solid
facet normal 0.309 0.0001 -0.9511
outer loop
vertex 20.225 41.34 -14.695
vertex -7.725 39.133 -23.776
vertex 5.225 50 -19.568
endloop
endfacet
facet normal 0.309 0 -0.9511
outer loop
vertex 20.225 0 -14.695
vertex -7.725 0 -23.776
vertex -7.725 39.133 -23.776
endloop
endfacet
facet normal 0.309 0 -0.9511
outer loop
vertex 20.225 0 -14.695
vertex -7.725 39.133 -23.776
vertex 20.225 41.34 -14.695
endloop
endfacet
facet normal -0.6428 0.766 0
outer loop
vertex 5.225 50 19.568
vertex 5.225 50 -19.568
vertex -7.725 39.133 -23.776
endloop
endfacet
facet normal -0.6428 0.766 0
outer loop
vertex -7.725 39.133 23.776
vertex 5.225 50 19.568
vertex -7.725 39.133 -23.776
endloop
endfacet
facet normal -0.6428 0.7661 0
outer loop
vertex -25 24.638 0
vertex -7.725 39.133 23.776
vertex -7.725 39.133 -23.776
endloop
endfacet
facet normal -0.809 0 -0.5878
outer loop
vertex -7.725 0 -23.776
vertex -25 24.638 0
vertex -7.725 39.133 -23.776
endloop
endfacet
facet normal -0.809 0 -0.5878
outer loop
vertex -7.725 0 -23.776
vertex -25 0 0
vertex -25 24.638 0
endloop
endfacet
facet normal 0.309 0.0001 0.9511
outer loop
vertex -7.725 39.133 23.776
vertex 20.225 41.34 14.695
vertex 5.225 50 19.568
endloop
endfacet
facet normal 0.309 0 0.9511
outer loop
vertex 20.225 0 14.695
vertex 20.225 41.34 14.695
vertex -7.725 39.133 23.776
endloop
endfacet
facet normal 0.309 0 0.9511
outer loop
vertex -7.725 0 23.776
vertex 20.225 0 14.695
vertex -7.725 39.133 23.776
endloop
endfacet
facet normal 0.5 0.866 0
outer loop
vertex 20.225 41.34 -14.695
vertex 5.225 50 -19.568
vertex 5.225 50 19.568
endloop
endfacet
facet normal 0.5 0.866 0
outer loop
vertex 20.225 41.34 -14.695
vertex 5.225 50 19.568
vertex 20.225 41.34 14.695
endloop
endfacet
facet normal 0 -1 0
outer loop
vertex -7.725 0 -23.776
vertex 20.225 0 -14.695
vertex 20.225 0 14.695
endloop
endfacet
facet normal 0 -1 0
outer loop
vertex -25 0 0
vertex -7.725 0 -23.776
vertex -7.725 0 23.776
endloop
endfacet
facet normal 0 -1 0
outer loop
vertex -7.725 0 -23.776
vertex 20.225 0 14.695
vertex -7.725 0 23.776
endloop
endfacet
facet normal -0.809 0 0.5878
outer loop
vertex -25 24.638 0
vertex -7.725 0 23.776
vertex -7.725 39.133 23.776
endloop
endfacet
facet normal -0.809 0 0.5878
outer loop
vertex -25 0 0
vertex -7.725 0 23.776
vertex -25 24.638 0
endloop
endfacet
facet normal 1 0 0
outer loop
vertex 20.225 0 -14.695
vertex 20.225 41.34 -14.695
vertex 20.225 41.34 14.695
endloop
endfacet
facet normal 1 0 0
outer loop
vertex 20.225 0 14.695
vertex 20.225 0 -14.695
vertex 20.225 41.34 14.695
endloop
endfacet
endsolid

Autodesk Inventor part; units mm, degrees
ref_plane "YZ Plane" through (0, 0, 0) normal (1, 0, 0) x (0, 1, 0)
ref_plane "XZ Plane" through (0, 0, 0) normal (0, 1, 0) x (-1, 0, 0)
ref_plane "XY Plane" through (0, 0, 0) normal (0, 0, 1) x (1, 0, 0)
sketch "Эскиз3" plane through (0, 0, 0) normal (1, 0, 0) x (0, 1, 0)
  line L0 (50, 7.7254) -> (50, -20.2254) projected
  line L1 (50, -6.25) -> (41.9313, -20.2254)
  line L2 (50, -6.25) -> (23.7781, 25)
  line L3 (50, 25) -> (50, 7.7254) projected
  line L4 (0, -20.2254) -> (50, -20.2254) projected
  line L5 (0, 25) -> (50, 25) projected
  line L6 (23.7781, 25) -> (25, -20.2254)
  point P0 (0, 0)
  dimension "d4" = 140
  dimension "d5" = 150
extrude "Выдавливание2" [suppressed]
sketch "Эскиз4" plane through (0, 0, 0) normal (1, 0, 0) x (0, 1, 0)
  line L0 (50, -20.2254) -> (50, -6.25) projected
  line L1 (50, -6.25) -> (41.9313, -20.2254)
  line L2 (0, -20.2254) -> (50, -20.2254) projected
  line L3 (50, -6.25) -> (66.1374, -6.25) construction
  point P0 (0, 0)
  dimension "d8" = 120
extrude "Выдавливание3" [suppressed]
sketch "Эскиз5" plane through (0, 0, 0) normal (0, 1, 0) x (-1, 0, 0)
  circle A0 centre (0, 0) radius 25
  line L0 (25, 0) -> (7.7254, -23.7764)
  line L1 (7.7254, -23.7764) -> (-20.2254, -14.6946)
  line L2 (-20.2254, -14.6946) -> (-20.2254, 14.6946)
  line L3 (-20.2254, 14.6946) -> (7.7254, 23.7764)
  line L4 (7.7254, 23.7764) -> (25, 0)
  dimension "d11" = 50
extrude "Выдавливание4" add sketch "Эскиз5" along normal blind 50 contours L0 L1 L2 L3 L4
sketch "Эскиз6" plane through (0, 50, 0) normal (0, 1, 0) x (1, 0, 0)
  line L0 (-7.7254, -23.7764) -> (20.2254, -14.6946) projected
  line L1 (5.2254, -19.5684) -> (5.2254, 19.5684)
  line L2 (20.2254, 14.6946) -> (-7.7254, 23.7764) projected
  line L3 (20.2254, -14.6946) -> (20.2254, 14.6946) projected
  point P0 (0, 0)
  dimension "d14" = 15
sketch "Эскиз7" plane through (0, 0, 0) normal (0, 0, 1) x (1, 0, 0)
  line L0 (-7.7254, 50) -> (20.2254, 50) projected
  line L1 (20.2254, 50) -> (5.2254, 50)
  line L2 (5.2254, 50) -> (20.2254, 41.3397)
  line L3 (20.2254, 0) -> (20.2254, 50) projected
  line L4 (5.2254, 50) -> (22.5459, 50) construction
  line L5 (20.2254, 41.3397) -> (20.2254, 50)
  point P0 (0, 0)
  dimension "d15" = 15
  dimension "d16" = 30
extrude "Выдавливание5" cut sketch "Эскиз7" along normal mid plane 50
sketch "Эскиз8" plane through (0, 0, 0) normal (0, 0, 1) x (1, 0, 0)
  line L0 (-25, 50) -> (-7.7254, 50) projected
  line L1 (-25, 50) -> (5.2254, 50)
  line L2 (5.2254, 50) -> (-25, 24.6379)
  line L3 (-25, 0) -> (-25, 50) projected
  line L4 (-25, 24.6379) -> (-25, 50)
  point P0 (0, 0)
  dimension "d19" = 40
extrude "Выдавливание6" cut sketch "Эскиз8" along normal mid plane 50
properties part number "Призма"
